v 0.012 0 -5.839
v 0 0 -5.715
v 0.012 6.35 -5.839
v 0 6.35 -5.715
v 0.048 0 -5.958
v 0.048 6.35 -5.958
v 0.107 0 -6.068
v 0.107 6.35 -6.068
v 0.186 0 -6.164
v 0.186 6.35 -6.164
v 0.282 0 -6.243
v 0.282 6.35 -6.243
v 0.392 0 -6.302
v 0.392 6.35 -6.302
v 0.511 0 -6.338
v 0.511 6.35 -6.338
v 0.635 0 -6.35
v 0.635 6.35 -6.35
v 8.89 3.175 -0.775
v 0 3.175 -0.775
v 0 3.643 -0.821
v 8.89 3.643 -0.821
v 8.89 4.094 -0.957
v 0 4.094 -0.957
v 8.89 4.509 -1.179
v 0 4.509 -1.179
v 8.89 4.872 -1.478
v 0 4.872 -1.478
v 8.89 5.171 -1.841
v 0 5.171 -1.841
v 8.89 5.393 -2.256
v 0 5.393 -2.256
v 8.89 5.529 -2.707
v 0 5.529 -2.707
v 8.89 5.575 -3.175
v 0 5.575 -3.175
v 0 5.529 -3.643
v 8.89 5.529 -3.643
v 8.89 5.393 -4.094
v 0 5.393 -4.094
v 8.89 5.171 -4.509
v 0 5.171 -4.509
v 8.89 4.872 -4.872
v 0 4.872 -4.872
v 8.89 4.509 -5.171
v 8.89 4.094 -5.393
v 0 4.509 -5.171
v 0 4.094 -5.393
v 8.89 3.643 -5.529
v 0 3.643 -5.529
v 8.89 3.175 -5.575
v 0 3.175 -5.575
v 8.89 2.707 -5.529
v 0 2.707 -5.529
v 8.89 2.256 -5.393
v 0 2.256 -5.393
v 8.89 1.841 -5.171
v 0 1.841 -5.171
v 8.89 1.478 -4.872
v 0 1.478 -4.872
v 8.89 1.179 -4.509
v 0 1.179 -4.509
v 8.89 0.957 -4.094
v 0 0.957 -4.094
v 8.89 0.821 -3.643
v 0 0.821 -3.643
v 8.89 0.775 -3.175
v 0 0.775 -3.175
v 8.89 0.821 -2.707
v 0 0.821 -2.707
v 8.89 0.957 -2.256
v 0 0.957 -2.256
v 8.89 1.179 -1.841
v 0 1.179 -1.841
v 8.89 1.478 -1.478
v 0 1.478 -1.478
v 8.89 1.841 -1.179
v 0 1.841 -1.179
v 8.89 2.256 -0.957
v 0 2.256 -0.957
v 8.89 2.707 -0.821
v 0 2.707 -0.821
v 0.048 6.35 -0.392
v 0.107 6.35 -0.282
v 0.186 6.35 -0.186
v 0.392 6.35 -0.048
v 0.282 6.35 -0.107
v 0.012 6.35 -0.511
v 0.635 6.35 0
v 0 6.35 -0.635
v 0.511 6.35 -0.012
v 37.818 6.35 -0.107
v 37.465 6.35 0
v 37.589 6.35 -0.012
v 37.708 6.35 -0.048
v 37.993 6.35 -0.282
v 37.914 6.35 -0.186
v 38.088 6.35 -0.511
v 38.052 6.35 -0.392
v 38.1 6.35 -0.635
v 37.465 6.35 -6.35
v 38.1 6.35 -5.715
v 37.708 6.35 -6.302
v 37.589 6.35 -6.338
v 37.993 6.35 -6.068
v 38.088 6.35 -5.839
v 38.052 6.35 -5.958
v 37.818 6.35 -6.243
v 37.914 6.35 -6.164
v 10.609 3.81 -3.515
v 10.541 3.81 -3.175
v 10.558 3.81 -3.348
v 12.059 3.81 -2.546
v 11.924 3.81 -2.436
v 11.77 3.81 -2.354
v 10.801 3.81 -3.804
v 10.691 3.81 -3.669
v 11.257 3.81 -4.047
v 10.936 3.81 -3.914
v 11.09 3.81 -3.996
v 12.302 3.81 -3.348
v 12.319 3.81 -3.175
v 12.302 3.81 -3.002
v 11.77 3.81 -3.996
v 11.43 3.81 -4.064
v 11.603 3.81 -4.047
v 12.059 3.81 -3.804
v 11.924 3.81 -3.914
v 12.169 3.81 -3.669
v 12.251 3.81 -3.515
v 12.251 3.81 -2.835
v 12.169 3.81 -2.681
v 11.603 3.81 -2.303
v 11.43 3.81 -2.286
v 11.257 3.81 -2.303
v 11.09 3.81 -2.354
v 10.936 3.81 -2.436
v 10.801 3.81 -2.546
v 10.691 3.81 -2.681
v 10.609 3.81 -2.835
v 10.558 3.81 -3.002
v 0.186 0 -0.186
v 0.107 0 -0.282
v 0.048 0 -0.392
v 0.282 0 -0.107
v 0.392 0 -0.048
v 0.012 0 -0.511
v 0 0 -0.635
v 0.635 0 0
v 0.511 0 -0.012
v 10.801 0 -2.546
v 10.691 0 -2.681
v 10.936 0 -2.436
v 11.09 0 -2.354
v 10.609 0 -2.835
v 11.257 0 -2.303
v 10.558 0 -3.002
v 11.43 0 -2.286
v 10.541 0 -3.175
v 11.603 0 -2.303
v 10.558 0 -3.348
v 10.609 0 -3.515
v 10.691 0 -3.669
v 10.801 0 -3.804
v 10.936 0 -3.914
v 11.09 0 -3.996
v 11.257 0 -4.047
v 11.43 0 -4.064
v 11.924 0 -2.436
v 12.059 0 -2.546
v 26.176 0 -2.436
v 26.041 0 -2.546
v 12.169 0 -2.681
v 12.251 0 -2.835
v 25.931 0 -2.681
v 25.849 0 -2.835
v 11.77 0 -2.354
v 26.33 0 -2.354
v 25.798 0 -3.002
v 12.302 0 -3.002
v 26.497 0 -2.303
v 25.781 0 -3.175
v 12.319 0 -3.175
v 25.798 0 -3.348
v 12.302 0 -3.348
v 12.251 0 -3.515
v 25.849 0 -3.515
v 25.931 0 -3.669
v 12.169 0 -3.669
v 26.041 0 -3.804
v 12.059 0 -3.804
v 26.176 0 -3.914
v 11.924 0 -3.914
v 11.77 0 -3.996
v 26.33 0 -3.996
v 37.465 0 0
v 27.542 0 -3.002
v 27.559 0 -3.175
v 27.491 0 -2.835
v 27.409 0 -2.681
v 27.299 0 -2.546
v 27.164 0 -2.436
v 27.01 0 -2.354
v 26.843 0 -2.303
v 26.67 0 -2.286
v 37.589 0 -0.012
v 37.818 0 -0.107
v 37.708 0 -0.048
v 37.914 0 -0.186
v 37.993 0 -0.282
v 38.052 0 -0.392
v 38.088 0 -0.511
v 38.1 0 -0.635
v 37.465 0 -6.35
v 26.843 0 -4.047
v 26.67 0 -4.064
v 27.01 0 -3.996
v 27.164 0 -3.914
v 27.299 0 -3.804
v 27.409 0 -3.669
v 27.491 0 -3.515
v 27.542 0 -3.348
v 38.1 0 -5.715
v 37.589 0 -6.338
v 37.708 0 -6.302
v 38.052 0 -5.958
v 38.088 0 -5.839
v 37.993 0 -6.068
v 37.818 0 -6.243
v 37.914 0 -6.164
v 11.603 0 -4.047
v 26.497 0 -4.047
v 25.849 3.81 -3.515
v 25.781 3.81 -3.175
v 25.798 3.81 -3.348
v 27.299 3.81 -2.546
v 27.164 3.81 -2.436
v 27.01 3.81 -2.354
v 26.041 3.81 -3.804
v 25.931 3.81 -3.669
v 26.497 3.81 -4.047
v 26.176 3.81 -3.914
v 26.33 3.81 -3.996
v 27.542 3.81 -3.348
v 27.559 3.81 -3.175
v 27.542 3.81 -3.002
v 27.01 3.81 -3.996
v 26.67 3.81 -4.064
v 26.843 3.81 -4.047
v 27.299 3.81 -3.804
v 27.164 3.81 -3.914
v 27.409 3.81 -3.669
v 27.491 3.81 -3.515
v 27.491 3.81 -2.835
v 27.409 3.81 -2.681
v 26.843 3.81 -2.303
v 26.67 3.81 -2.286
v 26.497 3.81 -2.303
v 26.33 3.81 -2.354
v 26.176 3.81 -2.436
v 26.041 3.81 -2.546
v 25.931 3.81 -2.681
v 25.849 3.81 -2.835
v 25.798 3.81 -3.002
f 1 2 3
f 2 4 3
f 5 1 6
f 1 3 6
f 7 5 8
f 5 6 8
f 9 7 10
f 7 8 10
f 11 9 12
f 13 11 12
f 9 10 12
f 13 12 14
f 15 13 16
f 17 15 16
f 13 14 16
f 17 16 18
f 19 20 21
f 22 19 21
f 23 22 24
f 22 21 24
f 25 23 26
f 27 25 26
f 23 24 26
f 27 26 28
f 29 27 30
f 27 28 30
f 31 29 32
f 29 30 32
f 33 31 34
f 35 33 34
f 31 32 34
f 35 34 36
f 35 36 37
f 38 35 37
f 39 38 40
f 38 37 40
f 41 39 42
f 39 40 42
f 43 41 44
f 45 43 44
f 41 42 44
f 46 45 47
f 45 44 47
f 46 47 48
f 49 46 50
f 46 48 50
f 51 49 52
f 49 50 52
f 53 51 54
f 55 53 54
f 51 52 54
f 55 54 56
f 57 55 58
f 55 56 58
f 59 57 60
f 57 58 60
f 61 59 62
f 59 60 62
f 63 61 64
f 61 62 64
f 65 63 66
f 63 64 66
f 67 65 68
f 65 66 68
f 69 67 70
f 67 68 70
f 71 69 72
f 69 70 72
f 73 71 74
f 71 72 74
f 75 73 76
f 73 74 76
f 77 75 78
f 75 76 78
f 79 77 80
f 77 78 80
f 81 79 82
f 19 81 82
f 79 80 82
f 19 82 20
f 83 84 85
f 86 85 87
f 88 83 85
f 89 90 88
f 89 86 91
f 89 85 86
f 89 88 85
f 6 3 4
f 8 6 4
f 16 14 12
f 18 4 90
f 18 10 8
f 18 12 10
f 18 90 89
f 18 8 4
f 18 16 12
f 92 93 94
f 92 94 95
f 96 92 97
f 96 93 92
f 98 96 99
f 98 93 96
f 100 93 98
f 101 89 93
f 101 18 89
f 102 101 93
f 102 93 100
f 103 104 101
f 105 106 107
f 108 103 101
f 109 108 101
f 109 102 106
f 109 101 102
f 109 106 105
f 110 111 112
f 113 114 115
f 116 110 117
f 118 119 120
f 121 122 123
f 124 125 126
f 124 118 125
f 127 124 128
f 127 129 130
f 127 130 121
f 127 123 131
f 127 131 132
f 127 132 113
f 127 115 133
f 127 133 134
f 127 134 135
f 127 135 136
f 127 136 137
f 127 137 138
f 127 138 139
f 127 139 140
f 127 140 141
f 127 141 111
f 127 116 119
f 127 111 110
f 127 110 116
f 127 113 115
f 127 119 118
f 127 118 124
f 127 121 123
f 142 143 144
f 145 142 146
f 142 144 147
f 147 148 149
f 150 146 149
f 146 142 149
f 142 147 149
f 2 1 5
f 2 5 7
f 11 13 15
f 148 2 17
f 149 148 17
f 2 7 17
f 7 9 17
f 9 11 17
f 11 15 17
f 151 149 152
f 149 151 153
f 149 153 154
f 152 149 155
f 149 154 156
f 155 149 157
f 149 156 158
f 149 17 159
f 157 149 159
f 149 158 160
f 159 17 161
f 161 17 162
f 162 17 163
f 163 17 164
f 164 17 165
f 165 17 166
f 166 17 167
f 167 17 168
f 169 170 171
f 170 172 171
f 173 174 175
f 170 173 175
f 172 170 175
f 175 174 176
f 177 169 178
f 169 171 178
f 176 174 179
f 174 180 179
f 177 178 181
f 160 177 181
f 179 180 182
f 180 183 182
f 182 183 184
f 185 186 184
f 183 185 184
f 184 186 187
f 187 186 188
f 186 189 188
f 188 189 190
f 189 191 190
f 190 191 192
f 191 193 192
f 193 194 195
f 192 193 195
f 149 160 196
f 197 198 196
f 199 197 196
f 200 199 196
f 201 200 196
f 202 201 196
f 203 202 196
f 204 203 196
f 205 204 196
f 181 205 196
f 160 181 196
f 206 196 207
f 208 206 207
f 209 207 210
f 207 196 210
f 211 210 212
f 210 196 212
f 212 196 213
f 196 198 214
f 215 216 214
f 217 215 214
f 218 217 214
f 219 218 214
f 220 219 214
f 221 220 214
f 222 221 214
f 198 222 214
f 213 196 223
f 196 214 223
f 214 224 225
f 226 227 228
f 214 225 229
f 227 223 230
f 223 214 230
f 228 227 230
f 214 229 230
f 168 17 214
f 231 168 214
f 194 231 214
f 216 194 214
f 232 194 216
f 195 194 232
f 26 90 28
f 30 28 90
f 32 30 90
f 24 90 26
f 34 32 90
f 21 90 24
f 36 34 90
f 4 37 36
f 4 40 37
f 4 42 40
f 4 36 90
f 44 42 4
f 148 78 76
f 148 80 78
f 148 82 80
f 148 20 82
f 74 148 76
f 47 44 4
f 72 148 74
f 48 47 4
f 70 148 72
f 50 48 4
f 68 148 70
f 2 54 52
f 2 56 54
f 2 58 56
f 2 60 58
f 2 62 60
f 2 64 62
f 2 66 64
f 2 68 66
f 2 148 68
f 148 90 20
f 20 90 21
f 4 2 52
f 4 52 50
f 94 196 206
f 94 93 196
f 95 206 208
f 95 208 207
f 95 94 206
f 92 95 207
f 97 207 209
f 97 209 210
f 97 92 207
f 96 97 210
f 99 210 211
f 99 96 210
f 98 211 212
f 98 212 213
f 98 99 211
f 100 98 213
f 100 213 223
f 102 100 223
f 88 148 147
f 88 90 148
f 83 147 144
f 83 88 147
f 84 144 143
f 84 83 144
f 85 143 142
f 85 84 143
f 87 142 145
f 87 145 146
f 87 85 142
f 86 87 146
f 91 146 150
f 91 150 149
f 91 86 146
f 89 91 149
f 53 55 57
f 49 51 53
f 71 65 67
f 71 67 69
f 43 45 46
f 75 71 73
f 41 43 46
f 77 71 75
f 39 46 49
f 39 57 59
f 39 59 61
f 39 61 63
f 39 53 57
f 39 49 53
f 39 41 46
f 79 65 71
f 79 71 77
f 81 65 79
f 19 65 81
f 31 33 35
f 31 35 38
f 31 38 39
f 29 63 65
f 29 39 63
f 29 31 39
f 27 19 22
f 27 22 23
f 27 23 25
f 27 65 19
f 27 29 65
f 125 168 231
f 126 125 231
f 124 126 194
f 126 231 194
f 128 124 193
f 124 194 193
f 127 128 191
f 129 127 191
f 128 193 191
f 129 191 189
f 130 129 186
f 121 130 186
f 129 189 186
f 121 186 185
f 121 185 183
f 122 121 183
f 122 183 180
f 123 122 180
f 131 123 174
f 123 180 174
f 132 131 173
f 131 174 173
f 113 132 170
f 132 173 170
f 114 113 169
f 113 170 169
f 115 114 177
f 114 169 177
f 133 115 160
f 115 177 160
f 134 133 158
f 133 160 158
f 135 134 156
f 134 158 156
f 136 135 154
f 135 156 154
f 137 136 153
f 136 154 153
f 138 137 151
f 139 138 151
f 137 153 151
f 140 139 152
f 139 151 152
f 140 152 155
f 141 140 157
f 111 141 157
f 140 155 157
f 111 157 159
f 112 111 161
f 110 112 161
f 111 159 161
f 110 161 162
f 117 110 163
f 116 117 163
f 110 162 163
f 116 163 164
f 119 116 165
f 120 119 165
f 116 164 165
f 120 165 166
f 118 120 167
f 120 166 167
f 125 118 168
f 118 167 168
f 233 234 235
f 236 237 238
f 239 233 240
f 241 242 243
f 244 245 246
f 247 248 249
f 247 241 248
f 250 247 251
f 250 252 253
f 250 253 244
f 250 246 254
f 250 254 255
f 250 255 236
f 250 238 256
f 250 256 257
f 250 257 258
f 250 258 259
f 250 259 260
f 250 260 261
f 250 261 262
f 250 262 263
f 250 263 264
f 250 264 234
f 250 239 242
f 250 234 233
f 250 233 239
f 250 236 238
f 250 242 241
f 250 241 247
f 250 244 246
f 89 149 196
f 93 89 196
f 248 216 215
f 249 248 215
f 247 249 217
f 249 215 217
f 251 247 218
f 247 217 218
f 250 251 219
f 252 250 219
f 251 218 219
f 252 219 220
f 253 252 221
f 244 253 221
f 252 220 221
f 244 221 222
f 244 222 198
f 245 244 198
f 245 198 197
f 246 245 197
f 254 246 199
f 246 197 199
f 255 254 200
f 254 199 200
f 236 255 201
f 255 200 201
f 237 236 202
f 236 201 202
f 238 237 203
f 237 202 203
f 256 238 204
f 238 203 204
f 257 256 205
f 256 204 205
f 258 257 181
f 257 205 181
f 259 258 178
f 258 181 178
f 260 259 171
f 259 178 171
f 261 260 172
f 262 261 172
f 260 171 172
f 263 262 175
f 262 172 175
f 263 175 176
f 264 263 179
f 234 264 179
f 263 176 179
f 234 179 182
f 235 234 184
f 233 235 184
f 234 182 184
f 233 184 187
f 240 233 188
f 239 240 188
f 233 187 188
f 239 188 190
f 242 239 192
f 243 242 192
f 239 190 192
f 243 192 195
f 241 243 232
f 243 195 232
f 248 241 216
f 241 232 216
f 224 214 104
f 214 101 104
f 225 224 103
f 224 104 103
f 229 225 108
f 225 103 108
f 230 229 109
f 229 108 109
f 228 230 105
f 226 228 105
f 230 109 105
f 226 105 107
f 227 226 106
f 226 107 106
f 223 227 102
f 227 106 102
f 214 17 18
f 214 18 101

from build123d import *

# Parameters (mm, degrees)
SKETCH1_W           = 38.1
SKETCH1_H           = 6.35
BOSS_EXTRUDE1_DEPTH = 6.35
SKETCH2_R           = 2.4003
CUT_EXTRUDE1_DEPTH  = 8.89
FILLET1_R           = 0.635
SKETCH3_R           = 0.889
CUT_EXTRUDE2_DEPTH  = 3.81


with BuildPart() as part:
    # Sketch1 → Boss-Extrude1 (new body)
    with BuildSketch(Plane(origin=(0, 0, 0), x_dir=(1, 0, 0), z_dir=(0, 1, 0))):
        with Locations((19.05, 3.175)):
            Rectangle(SKETCH1_W, SKETCH1_H)
    extrude(amount=BOSS_EXTRUDE1_DEPTH)

    # Sketch2 → Cut-Extrude1 (cut)
    with BuildSketch(Plane.ZY):
        with Locations((-3.175, 3.175)):
            Circle(SKETCH2_R)
    extrude(amount=-CUT_EXTRUDE1_DEPTH, mode=Mode.SUBTRACT)

    # Fillet1
    fillet1_edges = [part.edges().sort_by_distance(p)[0] for p in [
        (0, 3.175, -6.35),
        (38.1, 3.175, -6.35),
        (38.1, 3.175, 0),
        (0, 3.175, 0),
    ]]
    fillet(fillet1_edges, radius=FILLET1_R)

    # Sketch3 → Cut-Extrude2 (cut)
    with BuildSketch(Plane.XZ):
        with Locations(Location((11.43, -3.175, 0), (0, 0, 270))):
            Circle(SKETCH3_R)
        with Locations(Location((26.67, -3.175, 0), (0, 0, 270))):
            Circle(SKETCH3_R)
    extrude(amount=-CUT_EXTRUDE2_DEPTH, mode=Mode.SUBTRACT)


solid = part.part
